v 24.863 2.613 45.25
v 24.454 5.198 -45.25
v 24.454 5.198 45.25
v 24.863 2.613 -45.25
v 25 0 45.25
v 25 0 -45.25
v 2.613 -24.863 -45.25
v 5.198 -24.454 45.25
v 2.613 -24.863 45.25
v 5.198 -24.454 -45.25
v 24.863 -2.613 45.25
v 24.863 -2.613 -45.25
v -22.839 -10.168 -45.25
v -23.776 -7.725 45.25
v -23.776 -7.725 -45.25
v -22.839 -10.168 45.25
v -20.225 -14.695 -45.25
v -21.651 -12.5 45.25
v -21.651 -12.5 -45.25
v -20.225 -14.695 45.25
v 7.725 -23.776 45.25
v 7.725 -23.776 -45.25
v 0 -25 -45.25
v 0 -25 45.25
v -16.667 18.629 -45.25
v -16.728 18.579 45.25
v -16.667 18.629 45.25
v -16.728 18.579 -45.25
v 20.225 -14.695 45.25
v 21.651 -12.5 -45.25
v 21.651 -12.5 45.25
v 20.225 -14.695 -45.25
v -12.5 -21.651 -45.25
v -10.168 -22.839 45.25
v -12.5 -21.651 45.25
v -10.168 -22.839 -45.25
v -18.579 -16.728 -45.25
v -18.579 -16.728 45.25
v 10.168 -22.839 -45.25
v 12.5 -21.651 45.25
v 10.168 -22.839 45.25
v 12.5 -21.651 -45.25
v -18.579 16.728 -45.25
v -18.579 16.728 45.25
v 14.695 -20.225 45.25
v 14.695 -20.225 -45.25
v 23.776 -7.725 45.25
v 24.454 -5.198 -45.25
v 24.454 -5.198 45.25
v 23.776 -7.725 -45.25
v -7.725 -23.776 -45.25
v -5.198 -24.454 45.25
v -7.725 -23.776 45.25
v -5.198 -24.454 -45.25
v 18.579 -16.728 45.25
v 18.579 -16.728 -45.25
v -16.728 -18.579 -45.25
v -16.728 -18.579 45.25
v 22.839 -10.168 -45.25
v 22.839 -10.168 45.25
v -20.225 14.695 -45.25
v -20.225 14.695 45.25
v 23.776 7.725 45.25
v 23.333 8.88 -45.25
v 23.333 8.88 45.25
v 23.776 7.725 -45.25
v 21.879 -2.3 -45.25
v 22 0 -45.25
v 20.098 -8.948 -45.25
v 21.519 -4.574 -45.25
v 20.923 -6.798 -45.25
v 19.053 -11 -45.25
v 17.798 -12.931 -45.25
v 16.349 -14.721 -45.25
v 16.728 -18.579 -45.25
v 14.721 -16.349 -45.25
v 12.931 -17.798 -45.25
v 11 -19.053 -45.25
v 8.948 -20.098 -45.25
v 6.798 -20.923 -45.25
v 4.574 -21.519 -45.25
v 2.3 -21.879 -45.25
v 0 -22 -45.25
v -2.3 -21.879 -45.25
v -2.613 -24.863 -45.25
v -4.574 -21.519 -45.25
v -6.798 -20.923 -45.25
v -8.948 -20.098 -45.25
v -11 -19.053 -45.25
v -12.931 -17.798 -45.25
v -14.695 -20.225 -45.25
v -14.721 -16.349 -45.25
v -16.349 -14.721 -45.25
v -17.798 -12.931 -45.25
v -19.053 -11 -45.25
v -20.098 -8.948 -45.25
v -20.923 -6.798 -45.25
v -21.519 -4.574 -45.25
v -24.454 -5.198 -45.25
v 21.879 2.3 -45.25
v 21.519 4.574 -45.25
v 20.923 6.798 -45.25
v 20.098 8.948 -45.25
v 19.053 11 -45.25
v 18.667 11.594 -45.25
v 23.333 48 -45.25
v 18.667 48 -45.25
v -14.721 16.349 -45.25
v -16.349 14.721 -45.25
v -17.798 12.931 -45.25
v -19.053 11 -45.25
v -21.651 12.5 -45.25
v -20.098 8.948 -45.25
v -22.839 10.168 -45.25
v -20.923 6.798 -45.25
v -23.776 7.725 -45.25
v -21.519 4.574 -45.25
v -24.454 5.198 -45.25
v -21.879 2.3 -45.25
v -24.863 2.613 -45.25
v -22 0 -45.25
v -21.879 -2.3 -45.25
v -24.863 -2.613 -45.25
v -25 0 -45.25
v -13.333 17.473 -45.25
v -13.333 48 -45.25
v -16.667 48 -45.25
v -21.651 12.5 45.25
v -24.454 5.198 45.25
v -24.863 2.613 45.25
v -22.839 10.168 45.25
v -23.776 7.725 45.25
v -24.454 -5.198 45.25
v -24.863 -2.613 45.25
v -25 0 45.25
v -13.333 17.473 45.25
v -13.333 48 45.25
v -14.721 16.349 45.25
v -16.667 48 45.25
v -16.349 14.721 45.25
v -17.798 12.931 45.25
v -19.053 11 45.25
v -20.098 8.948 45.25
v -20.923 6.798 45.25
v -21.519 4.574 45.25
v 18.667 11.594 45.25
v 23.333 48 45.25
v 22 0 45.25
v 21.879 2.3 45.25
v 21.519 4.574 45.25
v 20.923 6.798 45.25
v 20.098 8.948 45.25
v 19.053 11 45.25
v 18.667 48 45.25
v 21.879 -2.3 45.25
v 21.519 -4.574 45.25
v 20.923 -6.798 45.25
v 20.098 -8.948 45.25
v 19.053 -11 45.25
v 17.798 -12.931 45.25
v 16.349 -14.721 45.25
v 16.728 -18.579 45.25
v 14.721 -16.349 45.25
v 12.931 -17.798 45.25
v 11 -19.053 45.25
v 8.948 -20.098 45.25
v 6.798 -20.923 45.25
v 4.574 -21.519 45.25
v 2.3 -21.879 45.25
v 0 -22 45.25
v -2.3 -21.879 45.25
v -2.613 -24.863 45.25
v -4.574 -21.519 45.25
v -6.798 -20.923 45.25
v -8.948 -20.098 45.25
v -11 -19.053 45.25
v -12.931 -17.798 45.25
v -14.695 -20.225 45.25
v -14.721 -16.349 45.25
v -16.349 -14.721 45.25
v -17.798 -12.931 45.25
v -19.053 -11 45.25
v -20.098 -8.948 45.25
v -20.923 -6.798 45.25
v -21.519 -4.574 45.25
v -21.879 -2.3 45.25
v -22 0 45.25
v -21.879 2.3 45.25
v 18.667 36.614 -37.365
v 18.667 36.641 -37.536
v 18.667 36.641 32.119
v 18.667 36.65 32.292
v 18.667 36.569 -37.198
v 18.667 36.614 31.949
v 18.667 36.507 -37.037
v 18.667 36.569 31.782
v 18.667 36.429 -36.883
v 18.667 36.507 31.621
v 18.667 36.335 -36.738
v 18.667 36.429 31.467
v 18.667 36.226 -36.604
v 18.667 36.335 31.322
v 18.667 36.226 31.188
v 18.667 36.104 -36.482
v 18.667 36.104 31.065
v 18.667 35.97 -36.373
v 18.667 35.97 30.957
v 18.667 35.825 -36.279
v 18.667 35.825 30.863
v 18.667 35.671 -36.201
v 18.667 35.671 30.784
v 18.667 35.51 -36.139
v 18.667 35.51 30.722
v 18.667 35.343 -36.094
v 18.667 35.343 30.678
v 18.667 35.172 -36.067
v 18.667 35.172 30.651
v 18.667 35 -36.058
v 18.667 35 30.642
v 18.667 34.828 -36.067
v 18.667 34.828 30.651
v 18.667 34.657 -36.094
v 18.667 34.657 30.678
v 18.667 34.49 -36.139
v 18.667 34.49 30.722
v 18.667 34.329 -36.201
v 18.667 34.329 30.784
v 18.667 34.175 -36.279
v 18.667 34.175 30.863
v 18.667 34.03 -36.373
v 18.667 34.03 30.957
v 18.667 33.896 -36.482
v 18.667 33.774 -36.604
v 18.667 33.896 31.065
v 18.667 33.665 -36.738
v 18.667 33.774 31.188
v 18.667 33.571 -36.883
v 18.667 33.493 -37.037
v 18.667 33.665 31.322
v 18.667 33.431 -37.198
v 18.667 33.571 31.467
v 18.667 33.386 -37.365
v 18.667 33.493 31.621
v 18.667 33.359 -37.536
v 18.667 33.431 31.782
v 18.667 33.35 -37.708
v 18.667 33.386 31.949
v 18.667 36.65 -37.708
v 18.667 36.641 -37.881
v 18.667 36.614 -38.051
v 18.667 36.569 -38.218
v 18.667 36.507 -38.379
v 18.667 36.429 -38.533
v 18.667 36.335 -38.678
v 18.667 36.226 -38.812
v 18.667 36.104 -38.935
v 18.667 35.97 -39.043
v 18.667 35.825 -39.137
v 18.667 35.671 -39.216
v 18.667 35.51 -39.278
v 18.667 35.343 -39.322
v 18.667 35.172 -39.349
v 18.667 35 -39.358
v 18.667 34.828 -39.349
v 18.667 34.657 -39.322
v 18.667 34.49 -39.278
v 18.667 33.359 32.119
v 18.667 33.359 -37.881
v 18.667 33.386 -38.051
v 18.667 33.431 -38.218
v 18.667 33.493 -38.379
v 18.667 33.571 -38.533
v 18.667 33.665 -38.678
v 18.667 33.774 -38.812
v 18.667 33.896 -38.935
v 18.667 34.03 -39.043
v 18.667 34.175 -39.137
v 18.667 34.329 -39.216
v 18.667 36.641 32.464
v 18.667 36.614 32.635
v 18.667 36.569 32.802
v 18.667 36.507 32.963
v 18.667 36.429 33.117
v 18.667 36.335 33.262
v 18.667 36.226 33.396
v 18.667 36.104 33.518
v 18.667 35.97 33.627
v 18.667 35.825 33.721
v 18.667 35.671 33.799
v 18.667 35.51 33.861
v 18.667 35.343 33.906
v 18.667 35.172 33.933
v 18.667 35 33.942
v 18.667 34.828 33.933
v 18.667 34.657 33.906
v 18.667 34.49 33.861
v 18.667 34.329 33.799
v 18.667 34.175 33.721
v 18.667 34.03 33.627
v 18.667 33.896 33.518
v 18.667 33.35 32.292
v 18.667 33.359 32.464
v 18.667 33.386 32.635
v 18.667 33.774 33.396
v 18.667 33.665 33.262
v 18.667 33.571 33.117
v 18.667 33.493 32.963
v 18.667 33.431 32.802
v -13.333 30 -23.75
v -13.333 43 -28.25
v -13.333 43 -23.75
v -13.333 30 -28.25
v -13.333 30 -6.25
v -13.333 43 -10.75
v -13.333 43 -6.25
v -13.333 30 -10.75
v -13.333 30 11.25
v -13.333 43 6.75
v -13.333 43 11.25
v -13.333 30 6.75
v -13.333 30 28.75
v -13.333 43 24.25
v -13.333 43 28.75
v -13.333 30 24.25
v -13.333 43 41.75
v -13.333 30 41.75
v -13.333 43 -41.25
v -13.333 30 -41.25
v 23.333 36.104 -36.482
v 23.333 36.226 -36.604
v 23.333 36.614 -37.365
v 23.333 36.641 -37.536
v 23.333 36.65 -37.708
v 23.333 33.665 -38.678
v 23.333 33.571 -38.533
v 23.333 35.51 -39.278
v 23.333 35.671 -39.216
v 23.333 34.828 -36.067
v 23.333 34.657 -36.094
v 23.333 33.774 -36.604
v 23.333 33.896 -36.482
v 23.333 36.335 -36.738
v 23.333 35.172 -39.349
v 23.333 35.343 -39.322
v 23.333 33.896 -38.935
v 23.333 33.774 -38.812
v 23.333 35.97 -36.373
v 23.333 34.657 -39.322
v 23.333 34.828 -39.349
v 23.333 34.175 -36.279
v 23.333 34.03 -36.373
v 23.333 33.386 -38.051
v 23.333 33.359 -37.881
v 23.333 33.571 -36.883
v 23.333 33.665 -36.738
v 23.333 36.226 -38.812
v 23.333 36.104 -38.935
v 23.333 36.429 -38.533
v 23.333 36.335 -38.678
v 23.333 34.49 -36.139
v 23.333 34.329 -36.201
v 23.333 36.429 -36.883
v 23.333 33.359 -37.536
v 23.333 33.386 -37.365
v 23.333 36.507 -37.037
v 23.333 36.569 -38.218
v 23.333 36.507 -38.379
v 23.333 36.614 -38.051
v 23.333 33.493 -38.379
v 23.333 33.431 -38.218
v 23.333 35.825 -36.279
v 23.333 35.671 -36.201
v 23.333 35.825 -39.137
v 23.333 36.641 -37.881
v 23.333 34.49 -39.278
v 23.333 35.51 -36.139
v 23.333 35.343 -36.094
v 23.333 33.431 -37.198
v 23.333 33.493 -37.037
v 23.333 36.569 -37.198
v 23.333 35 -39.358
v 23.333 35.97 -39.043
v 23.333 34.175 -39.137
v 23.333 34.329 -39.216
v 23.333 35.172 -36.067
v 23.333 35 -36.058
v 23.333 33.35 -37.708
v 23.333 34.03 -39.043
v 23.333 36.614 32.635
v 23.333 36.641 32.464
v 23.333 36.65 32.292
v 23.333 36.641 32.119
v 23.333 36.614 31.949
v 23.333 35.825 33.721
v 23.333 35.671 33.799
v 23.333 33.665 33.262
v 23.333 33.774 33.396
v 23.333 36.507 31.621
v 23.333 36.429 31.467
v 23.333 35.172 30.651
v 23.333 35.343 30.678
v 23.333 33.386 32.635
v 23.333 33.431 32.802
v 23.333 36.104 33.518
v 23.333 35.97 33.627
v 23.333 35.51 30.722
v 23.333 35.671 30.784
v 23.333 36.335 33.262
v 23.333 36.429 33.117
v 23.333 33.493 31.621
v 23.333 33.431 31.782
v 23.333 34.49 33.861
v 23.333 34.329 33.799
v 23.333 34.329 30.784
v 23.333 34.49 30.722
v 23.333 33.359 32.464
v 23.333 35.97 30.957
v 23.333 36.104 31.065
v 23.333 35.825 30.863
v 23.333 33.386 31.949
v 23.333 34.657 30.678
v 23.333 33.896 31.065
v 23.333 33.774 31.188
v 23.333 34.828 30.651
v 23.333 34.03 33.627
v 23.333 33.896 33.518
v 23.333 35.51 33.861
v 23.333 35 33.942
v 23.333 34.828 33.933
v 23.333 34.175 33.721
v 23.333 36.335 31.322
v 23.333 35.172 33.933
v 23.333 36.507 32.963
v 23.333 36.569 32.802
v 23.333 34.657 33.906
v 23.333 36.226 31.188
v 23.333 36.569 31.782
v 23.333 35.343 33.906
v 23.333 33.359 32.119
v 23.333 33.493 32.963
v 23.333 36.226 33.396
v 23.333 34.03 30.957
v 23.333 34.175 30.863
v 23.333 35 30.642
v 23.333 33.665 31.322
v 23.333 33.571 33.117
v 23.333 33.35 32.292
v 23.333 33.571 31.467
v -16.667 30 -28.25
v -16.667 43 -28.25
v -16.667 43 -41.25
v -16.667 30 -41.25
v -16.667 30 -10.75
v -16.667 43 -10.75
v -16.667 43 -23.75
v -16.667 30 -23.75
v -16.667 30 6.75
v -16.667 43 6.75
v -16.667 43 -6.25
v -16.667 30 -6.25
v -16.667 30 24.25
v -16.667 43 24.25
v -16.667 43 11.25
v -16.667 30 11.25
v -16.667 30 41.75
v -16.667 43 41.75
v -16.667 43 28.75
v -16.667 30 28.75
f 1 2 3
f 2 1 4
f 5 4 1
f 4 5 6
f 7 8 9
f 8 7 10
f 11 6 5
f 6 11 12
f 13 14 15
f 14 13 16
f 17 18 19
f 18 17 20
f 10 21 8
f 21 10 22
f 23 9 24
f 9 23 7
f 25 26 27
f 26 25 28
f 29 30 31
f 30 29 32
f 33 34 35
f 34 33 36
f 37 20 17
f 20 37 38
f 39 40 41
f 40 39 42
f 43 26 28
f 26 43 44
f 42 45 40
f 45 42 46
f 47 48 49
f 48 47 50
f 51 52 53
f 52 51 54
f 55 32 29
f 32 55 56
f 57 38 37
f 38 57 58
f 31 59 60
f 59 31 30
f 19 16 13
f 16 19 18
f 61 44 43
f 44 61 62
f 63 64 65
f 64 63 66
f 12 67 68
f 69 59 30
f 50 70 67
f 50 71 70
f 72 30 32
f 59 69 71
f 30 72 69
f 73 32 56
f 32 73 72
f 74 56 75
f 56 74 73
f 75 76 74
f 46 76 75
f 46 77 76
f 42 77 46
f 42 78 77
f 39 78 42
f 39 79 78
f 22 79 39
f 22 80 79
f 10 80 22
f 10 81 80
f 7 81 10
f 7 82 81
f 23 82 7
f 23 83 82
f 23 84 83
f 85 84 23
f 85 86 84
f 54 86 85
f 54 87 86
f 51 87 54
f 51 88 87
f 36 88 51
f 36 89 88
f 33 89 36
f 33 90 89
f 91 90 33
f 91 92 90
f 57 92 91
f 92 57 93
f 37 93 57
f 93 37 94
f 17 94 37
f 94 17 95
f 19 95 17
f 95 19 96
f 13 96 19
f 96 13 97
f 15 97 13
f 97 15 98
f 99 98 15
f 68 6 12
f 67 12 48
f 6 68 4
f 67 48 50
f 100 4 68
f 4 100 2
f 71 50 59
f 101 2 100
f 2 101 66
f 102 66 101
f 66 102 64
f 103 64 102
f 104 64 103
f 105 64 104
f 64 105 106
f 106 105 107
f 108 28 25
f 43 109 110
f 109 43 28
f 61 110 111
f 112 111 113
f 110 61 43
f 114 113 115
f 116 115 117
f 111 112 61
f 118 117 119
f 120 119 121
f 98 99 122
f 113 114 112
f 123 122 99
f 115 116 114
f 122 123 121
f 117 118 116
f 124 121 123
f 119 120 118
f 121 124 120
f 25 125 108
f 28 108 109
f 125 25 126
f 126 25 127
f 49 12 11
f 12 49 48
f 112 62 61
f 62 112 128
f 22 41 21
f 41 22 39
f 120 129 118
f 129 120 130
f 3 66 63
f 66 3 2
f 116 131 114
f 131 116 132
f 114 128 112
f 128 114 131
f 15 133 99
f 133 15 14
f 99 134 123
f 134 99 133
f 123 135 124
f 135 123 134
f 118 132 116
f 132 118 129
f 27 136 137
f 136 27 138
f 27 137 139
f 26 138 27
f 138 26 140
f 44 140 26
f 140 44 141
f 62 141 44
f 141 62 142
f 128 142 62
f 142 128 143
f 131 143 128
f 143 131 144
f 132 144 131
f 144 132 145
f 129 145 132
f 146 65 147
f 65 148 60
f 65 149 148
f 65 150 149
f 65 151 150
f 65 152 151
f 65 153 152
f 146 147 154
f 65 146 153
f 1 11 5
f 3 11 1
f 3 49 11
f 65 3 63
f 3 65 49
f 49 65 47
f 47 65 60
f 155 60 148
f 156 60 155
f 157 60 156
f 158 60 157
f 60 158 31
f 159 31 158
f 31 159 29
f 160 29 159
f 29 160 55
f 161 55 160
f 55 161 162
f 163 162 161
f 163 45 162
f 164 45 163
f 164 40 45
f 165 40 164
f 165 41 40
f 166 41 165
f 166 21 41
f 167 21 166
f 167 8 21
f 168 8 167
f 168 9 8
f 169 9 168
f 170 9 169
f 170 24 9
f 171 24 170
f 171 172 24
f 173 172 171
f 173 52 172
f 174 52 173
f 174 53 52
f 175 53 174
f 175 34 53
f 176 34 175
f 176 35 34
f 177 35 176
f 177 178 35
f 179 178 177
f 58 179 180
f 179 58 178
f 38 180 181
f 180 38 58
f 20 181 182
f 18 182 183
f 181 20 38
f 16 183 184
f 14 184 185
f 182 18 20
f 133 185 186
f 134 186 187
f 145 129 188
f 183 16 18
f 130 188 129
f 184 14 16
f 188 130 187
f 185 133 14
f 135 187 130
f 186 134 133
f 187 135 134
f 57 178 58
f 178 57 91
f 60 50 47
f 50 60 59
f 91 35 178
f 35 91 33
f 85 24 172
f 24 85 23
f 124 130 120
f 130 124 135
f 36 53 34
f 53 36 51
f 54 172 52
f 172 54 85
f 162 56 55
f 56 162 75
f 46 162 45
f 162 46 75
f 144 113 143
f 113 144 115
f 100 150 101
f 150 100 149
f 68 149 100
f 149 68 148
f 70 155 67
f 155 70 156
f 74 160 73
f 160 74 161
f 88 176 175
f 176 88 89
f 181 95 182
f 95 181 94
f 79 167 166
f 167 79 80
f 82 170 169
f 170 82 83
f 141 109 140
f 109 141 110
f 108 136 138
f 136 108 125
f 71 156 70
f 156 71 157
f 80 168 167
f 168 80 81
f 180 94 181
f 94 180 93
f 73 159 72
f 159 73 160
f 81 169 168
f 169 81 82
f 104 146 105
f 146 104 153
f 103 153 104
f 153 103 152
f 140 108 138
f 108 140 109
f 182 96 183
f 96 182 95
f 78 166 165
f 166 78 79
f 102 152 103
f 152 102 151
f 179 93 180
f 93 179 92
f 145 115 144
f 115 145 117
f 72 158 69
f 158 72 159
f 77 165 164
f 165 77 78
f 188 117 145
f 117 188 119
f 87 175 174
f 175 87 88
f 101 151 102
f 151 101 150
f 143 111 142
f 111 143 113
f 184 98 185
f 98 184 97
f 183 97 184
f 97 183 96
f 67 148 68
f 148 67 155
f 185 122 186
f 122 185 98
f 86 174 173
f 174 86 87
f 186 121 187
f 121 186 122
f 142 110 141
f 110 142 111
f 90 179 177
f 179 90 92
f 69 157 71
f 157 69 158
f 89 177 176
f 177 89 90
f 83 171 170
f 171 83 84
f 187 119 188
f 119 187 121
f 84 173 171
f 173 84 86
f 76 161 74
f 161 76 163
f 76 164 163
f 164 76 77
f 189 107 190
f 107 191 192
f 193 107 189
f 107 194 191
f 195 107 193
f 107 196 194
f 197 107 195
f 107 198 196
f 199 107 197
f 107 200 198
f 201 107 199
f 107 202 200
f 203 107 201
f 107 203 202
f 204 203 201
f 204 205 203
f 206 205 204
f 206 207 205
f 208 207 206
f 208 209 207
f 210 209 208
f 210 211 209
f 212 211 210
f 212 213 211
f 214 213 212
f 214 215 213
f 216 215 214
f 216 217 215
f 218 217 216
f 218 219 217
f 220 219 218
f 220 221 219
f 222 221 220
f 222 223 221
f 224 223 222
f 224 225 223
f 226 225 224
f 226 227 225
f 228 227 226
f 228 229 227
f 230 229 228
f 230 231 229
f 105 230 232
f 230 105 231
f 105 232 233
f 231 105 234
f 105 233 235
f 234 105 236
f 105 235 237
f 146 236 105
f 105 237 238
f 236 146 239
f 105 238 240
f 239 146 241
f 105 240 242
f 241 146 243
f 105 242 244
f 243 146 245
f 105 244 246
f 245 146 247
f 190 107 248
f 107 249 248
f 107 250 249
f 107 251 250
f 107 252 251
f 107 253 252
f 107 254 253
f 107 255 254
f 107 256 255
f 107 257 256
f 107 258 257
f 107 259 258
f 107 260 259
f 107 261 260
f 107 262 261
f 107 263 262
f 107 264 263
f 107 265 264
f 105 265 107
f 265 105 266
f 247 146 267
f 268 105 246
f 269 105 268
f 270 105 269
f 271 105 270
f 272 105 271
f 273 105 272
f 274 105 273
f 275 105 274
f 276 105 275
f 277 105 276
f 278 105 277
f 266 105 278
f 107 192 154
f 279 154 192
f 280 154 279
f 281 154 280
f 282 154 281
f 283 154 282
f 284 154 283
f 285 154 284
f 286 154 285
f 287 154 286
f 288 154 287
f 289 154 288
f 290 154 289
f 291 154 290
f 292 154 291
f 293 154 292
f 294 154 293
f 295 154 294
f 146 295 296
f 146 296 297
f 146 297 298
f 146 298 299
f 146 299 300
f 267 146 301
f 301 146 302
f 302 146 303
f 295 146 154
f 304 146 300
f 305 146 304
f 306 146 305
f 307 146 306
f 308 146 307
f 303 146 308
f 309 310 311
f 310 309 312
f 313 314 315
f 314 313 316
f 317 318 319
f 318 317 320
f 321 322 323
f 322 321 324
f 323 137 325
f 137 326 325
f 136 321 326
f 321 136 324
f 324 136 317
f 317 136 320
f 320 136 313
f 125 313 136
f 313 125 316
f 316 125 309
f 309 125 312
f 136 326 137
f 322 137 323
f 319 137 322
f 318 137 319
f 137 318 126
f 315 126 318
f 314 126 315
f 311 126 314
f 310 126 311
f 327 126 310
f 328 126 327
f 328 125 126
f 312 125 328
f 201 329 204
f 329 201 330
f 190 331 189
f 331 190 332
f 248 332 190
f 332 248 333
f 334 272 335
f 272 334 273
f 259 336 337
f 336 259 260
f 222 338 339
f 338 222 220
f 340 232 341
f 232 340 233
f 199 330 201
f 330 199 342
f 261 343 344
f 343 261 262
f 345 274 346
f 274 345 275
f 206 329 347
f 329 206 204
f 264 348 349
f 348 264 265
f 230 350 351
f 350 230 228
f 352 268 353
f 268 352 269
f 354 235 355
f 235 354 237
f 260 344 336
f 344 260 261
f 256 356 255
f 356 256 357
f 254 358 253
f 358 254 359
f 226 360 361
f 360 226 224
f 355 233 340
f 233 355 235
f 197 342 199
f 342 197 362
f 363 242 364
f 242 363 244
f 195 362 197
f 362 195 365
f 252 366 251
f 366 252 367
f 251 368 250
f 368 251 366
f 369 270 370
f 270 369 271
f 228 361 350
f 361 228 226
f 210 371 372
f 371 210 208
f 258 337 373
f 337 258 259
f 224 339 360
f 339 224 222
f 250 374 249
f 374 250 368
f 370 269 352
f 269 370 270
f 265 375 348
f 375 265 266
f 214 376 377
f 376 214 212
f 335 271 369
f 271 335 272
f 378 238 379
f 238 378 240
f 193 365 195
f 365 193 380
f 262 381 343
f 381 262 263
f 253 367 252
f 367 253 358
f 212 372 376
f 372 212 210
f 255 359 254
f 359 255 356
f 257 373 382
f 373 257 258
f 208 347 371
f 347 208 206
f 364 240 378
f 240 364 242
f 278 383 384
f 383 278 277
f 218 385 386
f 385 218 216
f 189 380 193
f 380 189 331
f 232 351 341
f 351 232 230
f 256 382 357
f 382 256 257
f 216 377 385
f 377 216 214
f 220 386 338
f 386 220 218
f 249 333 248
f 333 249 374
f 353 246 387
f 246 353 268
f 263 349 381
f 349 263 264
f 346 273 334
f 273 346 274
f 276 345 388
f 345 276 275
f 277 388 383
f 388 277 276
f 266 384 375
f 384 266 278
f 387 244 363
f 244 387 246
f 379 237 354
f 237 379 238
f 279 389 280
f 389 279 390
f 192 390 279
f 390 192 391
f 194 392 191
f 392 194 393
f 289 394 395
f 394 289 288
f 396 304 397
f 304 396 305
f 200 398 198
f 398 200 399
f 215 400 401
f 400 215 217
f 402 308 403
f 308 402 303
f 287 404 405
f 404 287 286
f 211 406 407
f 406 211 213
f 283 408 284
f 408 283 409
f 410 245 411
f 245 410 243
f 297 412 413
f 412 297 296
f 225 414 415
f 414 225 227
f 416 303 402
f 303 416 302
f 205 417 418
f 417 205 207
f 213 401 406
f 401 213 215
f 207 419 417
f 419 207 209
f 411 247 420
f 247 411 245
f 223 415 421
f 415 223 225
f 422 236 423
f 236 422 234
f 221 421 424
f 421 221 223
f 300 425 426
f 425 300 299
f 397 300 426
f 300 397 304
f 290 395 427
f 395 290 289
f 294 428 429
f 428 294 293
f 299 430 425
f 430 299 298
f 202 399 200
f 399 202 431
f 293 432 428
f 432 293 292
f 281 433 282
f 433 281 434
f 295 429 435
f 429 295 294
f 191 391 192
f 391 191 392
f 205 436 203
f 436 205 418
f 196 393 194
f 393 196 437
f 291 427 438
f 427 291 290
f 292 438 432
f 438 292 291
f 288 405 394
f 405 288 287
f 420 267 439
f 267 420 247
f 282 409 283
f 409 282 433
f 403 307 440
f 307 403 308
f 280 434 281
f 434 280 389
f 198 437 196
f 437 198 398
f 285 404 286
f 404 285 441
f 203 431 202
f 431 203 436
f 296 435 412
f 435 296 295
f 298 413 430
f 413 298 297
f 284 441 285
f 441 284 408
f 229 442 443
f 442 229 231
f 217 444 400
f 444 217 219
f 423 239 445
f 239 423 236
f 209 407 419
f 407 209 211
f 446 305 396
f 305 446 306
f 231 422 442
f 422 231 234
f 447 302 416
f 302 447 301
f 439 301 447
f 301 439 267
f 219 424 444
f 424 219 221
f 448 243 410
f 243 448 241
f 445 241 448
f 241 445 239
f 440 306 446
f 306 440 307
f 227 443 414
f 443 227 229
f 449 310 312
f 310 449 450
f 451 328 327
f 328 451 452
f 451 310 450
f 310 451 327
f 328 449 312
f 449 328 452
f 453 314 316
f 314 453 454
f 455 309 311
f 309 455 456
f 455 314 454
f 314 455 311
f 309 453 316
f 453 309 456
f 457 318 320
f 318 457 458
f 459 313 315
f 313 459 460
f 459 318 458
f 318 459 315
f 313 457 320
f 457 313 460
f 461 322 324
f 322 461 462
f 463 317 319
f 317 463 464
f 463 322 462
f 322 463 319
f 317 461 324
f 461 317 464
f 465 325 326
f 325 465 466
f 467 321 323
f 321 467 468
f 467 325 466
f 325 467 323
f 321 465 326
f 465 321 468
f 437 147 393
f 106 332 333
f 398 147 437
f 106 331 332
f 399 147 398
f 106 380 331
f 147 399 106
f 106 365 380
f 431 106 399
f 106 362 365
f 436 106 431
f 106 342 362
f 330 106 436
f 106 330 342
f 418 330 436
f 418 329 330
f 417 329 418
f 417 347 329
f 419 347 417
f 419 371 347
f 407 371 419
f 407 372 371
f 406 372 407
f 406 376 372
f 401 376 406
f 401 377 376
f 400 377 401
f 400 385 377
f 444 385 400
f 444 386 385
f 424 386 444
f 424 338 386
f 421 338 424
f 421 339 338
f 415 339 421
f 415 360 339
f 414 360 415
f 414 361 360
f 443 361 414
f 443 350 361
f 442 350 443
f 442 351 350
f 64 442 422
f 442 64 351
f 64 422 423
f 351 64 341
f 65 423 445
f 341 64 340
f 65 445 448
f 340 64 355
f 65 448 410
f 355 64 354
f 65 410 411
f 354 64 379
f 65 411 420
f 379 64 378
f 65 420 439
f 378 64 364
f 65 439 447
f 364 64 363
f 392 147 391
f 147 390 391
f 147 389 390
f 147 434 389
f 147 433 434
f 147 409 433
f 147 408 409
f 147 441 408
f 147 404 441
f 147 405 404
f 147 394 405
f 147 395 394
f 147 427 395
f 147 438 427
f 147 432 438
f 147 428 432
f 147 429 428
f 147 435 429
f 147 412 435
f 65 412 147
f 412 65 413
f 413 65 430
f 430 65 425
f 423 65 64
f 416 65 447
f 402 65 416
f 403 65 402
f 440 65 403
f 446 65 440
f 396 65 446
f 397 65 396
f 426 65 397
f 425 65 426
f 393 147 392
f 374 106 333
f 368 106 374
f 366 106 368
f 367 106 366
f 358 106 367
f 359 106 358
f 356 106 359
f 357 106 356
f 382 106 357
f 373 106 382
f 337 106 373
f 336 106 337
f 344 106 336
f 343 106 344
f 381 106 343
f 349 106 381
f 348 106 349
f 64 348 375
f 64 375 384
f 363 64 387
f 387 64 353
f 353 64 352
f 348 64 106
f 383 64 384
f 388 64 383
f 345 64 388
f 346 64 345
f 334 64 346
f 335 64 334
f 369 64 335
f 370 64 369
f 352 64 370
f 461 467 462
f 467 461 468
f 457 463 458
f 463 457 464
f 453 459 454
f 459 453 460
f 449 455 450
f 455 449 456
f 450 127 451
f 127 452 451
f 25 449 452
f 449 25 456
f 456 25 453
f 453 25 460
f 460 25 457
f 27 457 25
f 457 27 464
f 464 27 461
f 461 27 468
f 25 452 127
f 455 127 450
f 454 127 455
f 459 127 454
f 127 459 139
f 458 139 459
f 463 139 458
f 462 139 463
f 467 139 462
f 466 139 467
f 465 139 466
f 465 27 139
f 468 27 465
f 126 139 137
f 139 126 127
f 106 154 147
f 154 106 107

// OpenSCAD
joystick_ext_rad = 25;
joystick_int_rad = 22;
joystick_depth = 90.5;

joystick_ext_rect_height = 40; // dimension in y
joystick_ext_rect_depth = joystick_depth;	 // dimension in z
joystick_ext_rect_width = 40; // dimension in x

joystick_int_rect_height = 40; // dimension in y
joystick_int_rect_depth = joystick_depth;	 // dimension in z
joystick_int_rect_width = 32; // dimension in x

support_hole_rad = 1.65; 
support_hole_height = 15; 
support_holes_spacing = 70;

buttons_hole_size = 13;
buttons_holes_spacing = 17.5;

module pcb_support_holes(){
	rotate([90, 0, 90]) {
  		cylinder(r=support_hole_rad, h=support_hole_height, $fn = 60);
	}

	translate([0, 0, support_holes_spacing]) {
		rotate([90, 0, 90]) {
	  		cylinder(r=support_hole_rad, h=support_hole_height, $fn = 60);
		}
	}
}

module control_buttons_holes(){
	cube([10, buttons_hole_size, buttons_hole_size]);

	translate([0, 0, buttons_holes_spacing]) {
		cube([10, buttons_hole_size, buttons_hole_size]);
	}

	translate([0, 0, buttons_holes_spacing*2]) {
		cube([10, buttons_hole_size, buttons_hole_size]);
	}

	translate([0, 0, buttons_holes_spacing*3]) {
		cube([10, buttons_hole_size, buttons_hole_size]);
	}

	translate([0, 0, buttons_holes_spacing*4]) {
		cube([10, buttons_hole_size, buttons_hole_size]);
	}
}


// ---------------------------------- //

difference() {
  	cylinder(r=joystick_ext_rad, h=joystick_depth, $fn = 60, center=true);
  	cylinder(r=joystick_int_rad, h=joystick_depth, $fn = 60, center=true);
	translate([-joystick_int_rect_width/2.4, 10, -joystick_int_rect_depth/2]) {
		cube([joystick_int_rect_width, joystick_int_rect_height, joystick_int_rect_depth]);
	}
}

difference() {
	translate([-joystick_ext_rect_height/2.4, 8, -joystick_ext_rect_depth/2]) {
 		cube([joystick_ext_rect_width, joystick_ext_rect_height, joystick_ext_rect_depth]);
	}
	translate([-joystick_int_rect_width/2.4, 8, -joystick_int_rect_depth/2]) {
		cube([joystick_int_rect_width, joystick_int_rect_height, joystick_int_rect_depth]);
	}
	cylinder(r=joystick_int_rad, h=joystick_depth, $fn = 60, center=true);
	
	translate([15, 35, -joystick_depth/2.4]) {
		pcb_support_holes();
	}
	translate([-20, 30, (-34.25 - 7)]) {
		control_buttons_holes();
	}
}	
